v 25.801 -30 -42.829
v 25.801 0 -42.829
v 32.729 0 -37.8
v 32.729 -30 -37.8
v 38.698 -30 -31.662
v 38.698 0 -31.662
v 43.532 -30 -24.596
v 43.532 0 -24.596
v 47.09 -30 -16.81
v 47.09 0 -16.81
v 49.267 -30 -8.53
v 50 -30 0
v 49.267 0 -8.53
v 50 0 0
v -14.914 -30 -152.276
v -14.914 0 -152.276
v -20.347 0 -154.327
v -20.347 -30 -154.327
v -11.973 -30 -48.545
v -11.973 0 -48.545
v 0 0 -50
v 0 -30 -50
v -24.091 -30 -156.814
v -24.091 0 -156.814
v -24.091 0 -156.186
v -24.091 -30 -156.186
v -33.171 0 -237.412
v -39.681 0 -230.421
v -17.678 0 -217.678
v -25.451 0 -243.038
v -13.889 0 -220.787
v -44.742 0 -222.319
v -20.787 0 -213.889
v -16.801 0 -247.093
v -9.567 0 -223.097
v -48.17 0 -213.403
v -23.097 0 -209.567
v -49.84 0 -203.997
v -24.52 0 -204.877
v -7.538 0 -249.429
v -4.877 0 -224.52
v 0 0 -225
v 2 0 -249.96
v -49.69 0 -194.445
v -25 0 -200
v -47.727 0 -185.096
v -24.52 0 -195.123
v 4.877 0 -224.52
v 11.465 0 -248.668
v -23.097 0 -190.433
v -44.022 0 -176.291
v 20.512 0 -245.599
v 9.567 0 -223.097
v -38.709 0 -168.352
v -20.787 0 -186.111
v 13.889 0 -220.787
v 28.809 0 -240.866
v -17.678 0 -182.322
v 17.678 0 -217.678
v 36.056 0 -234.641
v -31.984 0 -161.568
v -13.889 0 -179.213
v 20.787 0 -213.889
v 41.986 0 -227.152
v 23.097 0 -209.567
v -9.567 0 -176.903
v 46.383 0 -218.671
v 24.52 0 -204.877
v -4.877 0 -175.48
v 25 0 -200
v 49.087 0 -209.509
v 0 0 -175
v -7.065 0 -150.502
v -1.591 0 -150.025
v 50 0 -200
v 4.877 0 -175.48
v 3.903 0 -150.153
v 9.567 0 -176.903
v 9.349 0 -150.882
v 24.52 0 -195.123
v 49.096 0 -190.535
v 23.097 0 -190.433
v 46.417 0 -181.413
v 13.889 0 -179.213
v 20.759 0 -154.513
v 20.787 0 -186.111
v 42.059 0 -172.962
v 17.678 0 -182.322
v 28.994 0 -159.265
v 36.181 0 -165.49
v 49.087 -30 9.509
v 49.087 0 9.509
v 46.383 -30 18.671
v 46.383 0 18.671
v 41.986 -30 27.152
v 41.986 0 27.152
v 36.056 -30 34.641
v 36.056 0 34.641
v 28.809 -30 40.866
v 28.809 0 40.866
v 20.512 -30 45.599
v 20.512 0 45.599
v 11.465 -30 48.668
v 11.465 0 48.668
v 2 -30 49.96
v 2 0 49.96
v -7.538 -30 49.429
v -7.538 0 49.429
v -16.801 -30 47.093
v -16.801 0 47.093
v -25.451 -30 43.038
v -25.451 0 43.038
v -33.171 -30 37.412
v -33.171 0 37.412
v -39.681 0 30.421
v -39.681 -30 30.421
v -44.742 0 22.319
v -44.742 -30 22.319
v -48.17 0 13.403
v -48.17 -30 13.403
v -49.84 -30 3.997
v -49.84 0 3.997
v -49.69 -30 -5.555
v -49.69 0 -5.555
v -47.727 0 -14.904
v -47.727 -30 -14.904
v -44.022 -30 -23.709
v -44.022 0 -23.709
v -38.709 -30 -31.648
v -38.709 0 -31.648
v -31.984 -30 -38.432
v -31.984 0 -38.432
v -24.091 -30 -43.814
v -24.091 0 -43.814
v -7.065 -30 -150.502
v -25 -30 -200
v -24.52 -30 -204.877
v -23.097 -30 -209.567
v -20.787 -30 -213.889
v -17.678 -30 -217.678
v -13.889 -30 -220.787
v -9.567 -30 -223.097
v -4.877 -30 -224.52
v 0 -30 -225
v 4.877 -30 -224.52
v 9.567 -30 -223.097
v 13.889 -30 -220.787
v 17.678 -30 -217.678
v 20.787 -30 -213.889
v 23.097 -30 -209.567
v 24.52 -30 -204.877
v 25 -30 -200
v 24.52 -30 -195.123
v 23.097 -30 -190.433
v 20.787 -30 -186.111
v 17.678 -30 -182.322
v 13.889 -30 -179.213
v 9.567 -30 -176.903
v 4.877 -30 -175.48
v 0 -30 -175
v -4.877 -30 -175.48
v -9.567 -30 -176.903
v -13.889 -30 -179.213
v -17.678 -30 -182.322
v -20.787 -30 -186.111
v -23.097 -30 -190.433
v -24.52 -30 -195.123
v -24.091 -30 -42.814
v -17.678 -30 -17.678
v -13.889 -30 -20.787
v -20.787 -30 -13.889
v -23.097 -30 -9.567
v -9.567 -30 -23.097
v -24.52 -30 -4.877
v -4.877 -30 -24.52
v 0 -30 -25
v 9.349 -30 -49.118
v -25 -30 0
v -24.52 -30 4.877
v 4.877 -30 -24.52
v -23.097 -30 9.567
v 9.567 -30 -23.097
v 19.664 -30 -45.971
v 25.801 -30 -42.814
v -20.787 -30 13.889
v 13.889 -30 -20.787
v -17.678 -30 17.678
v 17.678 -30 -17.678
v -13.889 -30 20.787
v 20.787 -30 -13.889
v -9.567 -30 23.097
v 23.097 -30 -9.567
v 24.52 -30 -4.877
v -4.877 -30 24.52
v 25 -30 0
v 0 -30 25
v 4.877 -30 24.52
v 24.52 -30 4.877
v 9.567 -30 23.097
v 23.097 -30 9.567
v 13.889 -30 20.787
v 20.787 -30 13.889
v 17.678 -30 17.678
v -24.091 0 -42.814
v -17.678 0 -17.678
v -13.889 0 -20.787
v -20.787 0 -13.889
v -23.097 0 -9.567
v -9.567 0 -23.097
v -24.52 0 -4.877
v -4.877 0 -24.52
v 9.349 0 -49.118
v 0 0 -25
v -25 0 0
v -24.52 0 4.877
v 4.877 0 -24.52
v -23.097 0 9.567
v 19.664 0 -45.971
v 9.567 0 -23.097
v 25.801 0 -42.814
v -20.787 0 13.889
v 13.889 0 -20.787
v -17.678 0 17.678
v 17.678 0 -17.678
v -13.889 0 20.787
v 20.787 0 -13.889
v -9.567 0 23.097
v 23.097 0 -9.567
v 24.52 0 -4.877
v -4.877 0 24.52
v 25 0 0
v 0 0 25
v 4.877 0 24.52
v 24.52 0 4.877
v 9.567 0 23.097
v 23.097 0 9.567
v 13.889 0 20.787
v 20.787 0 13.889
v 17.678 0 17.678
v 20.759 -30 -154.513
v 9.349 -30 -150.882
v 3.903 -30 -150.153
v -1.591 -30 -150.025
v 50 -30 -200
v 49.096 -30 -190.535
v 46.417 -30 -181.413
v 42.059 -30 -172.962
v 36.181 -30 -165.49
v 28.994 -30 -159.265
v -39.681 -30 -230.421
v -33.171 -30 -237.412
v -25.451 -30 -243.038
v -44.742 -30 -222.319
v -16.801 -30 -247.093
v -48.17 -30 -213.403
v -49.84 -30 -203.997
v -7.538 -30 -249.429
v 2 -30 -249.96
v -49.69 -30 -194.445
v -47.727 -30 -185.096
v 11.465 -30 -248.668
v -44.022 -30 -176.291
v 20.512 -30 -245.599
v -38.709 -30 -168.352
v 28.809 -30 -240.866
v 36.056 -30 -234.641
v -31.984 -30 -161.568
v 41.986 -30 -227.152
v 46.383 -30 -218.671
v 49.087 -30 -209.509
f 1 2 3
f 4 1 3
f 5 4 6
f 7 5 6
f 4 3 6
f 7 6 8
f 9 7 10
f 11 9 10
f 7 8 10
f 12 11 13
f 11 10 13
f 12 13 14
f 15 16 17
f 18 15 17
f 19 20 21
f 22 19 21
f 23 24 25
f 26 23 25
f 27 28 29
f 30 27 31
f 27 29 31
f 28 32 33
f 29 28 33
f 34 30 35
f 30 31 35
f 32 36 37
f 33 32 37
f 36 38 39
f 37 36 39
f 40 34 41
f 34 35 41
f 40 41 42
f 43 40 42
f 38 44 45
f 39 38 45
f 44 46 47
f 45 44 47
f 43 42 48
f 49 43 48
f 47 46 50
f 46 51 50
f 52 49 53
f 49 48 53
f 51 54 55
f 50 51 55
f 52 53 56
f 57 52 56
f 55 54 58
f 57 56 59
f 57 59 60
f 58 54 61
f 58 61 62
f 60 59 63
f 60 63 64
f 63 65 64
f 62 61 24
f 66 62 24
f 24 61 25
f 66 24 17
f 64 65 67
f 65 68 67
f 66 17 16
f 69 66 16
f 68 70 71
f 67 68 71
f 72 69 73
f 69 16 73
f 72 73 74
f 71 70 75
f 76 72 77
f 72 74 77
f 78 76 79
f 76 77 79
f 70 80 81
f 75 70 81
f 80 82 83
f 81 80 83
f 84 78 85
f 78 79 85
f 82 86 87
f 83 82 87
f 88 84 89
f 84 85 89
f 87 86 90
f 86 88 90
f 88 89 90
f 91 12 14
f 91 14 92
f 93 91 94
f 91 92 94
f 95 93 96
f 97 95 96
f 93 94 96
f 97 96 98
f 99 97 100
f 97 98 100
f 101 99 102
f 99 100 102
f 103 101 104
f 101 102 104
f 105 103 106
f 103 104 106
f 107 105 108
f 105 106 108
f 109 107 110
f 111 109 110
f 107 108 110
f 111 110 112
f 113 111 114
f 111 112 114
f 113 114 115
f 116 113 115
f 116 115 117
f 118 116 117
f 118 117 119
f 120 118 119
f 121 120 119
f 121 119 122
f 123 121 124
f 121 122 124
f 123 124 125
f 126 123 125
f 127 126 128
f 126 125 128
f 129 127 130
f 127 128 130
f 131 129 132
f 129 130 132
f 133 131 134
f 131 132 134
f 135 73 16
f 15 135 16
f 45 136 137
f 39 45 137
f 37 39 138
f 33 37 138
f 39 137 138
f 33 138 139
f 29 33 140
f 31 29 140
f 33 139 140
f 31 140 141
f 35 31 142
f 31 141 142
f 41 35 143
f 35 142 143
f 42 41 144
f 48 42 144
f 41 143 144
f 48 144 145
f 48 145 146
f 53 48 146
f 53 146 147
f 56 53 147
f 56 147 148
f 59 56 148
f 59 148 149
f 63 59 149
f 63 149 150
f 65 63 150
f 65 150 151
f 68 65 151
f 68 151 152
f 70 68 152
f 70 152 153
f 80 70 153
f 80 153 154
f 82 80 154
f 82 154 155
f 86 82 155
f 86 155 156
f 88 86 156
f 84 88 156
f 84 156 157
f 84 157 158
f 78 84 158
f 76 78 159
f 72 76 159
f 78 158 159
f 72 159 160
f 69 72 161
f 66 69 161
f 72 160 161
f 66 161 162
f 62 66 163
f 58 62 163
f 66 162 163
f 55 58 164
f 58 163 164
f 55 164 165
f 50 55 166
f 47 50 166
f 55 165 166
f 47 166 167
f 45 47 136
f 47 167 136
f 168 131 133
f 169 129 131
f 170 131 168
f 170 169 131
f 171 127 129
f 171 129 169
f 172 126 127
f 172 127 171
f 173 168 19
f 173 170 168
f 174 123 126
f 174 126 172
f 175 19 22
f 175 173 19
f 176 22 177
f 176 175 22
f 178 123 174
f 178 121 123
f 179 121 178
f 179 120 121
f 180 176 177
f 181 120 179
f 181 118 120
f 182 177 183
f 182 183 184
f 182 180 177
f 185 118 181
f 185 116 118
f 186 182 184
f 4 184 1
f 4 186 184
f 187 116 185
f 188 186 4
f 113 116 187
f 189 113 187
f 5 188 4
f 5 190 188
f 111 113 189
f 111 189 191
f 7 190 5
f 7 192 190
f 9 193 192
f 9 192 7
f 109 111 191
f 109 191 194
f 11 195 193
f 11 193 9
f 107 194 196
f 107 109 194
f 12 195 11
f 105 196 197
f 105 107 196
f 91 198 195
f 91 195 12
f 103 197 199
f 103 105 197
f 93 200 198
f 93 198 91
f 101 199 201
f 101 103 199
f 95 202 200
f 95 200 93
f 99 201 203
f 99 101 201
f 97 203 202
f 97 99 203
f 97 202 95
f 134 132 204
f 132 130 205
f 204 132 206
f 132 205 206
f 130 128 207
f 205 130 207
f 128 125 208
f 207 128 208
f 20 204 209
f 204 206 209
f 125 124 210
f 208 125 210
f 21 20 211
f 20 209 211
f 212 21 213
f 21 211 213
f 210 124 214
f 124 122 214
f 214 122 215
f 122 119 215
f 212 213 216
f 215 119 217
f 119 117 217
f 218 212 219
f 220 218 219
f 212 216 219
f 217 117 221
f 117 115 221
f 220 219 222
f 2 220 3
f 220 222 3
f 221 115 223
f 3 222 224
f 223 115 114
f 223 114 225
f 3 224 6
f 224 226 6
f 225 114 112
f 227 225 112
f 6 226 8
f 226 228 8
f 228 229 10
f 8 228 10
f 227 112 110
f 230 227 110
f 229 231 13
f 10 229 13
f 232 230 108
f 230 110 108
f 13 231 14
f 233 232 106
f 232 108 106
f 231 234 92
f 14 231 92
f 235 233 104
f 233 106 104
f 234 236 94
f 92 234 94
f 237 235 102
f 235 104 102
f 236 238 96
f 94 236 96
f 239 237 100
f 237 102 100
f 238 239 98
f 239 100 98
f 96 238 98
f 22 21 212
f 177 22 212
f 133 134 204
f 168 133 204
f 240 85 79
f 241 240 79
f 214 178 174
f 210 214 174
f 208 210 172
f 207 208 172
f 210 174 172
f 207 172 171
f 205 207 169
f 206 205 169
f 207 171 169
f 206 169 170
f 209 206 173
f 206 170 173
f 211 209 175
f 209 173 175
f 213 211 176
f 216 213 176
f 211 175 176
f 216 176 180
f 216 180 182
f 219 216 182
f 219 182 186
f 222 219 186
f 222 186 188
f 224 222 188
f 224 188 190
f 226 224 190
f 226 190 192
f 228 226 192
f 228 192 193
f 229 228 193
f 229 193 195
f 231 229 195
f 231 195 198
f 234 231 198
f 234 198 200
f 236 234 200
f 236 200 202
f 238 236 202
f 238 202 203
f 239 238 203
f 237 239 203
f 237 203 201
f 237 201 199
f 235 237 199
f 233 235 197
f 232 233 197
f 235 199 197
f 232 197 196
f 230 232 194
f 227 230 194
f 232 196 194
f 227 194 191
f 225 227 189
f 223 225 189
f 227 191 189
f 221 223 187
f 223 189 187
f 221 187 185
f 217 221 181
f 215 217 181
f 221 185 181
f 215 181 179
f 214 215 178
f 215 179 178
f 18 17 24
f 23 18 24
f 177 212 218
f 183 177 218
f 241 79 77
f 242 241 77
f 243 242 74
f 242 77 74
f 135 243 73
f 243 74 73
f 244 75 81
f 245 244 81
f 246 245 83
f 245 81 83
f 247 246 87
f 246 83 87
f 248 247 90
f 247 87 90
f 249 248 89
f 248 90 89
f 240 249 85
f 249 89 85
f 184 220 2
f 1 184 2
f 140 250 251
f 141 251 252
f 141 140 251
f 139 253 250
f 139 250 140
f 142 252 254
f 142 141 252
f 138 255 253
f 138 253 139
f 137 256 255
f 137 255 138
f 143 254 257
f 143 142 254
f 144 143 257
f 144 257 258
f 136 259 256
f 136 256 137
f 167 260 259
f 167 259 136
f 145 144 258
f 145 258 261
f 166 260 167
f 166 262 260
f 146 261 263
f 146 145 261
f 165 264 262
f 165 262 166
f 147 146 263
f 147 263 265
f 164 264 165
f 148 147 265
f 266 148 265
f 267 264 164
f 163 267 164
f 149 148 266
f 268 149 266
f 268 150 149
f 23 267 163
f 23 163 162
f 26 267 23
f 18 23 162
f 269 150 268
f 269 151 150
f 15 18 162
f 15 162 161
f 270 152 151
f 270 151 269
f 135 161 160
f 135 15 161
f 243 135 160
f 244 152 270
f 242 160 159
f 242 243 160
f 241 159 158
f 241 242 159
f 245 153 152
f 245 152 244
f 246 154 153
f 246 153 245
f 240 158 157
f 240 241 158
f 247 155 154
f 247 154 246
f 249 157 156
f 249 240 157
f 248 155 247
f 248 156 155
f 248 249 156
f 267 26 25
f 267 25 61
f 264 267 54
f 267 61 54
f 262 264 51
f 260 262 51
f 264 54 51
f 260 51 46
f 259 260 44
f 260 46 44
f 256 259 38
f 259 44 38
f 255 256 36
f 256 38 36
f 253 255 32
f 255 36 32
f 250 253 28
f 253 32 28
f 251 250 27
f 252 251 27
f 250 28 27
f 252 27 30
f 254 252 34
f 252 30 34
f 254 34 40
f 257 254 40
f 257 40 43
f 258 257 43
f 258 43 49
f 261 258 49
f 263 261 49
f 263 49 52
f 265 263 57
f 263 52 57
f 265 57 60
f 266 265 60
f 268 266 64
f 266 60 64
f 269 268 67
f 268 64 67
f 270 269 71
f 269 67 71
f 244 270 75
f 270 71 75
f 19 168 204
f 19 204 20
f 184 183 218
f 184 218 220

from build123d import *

# Parameters (mm, degrees)
F3_DEPTH = 30
F4_D     = 50
F4_2_D   = 50


with BuildPart() as f3:
    # F2 (on Front) → F3 (new body)
    with BuildSketch(Plane.XZ):
        with BuildLine():
            Line((-24.0908678128, -156.8137997318), (-24.0908678128, -156.1864166265))
            ThreePointArc((-24.0908678128, -156.1864166265), (-25.4505069631, -243.038026155), (50, -200))
            ThreePointArc((50, -200), (42.0590771407, -172.9623590142), (20.7586387969, -154.5128708831))
            Line((20.7586387969, -154.5128708831), (9.349064553, -150.8818262556))
            ThreePointArc((9.349064553, -150.8818262556), (1.1578270349, -150.013407432), (-7.0648341513, -150.5016351945))
            Line((-7.0648341513, -150.5016351945), (-14.9141062981, -152.2761125501))
            Line((-14.9141062981, -152.2761125501), (-20.3468686493, -154.3271969749))
            Line((-20.3468686493, -154.3271969749), (-24.0908678128, -156.8137997318))
        make_face()
    extrude(amount=F3_DEPTH)

    # F4 (through all)
    with Locations(Plane(origin=(0, 0, 0), x_dir=(1, 0, 0), z_dir=(0, 1, 0))):
        with Locations((0, 0), (0, 200)):
            Hole(F4_D / 2)


with BuildPart() as f3b:
    # F2 (on Front) → F3, piece 2 (new body)
    with BuildSketch(Plane.XZ):
        with BuildLine():
            Line((-24.0908678128, -42.8137997318), (-11.9733144536, -48.5452339679))
            Line((-11.9733144536, -48.5452339679), (0, -50))
            Line((0, -50), (9.349064553, -49.1181737444))
            Line((9.349064553, -49.1181737444), (19.6644283734, -45.9707543635))
            Line((19.6644283734, -45.9707543635), (25.8005227401, -42.8137997318))
            Line((25.8005227401, -42.8137997318), (25.8005227401, -42.8291142371))
            ThreePointArc((25.8005227401, -42.8291142371), (43.5317478227, -24.596482096), (50, 0))
            ThreePointArc((50, 0), (-25.4505069631, 43.038026155), (-24.0908678128, -43.8135833735))
            Line((-24.0908678128, -43.8135833735), (-24.0908678128, -42.8137997318))
        make_face()
    extrude(amount=F3_DEPTH)

    # F4#2 (through all)
    with Locations(Plane(origin=(0, 0, 0), x_dir=(1, 0, 0), z_dir=(0, 1, 0))):
        with Locations((0, 0), (0, 200)):
            Hole(F4_2_D / 2)


solid = Compound([f3.part, f3b.part])
